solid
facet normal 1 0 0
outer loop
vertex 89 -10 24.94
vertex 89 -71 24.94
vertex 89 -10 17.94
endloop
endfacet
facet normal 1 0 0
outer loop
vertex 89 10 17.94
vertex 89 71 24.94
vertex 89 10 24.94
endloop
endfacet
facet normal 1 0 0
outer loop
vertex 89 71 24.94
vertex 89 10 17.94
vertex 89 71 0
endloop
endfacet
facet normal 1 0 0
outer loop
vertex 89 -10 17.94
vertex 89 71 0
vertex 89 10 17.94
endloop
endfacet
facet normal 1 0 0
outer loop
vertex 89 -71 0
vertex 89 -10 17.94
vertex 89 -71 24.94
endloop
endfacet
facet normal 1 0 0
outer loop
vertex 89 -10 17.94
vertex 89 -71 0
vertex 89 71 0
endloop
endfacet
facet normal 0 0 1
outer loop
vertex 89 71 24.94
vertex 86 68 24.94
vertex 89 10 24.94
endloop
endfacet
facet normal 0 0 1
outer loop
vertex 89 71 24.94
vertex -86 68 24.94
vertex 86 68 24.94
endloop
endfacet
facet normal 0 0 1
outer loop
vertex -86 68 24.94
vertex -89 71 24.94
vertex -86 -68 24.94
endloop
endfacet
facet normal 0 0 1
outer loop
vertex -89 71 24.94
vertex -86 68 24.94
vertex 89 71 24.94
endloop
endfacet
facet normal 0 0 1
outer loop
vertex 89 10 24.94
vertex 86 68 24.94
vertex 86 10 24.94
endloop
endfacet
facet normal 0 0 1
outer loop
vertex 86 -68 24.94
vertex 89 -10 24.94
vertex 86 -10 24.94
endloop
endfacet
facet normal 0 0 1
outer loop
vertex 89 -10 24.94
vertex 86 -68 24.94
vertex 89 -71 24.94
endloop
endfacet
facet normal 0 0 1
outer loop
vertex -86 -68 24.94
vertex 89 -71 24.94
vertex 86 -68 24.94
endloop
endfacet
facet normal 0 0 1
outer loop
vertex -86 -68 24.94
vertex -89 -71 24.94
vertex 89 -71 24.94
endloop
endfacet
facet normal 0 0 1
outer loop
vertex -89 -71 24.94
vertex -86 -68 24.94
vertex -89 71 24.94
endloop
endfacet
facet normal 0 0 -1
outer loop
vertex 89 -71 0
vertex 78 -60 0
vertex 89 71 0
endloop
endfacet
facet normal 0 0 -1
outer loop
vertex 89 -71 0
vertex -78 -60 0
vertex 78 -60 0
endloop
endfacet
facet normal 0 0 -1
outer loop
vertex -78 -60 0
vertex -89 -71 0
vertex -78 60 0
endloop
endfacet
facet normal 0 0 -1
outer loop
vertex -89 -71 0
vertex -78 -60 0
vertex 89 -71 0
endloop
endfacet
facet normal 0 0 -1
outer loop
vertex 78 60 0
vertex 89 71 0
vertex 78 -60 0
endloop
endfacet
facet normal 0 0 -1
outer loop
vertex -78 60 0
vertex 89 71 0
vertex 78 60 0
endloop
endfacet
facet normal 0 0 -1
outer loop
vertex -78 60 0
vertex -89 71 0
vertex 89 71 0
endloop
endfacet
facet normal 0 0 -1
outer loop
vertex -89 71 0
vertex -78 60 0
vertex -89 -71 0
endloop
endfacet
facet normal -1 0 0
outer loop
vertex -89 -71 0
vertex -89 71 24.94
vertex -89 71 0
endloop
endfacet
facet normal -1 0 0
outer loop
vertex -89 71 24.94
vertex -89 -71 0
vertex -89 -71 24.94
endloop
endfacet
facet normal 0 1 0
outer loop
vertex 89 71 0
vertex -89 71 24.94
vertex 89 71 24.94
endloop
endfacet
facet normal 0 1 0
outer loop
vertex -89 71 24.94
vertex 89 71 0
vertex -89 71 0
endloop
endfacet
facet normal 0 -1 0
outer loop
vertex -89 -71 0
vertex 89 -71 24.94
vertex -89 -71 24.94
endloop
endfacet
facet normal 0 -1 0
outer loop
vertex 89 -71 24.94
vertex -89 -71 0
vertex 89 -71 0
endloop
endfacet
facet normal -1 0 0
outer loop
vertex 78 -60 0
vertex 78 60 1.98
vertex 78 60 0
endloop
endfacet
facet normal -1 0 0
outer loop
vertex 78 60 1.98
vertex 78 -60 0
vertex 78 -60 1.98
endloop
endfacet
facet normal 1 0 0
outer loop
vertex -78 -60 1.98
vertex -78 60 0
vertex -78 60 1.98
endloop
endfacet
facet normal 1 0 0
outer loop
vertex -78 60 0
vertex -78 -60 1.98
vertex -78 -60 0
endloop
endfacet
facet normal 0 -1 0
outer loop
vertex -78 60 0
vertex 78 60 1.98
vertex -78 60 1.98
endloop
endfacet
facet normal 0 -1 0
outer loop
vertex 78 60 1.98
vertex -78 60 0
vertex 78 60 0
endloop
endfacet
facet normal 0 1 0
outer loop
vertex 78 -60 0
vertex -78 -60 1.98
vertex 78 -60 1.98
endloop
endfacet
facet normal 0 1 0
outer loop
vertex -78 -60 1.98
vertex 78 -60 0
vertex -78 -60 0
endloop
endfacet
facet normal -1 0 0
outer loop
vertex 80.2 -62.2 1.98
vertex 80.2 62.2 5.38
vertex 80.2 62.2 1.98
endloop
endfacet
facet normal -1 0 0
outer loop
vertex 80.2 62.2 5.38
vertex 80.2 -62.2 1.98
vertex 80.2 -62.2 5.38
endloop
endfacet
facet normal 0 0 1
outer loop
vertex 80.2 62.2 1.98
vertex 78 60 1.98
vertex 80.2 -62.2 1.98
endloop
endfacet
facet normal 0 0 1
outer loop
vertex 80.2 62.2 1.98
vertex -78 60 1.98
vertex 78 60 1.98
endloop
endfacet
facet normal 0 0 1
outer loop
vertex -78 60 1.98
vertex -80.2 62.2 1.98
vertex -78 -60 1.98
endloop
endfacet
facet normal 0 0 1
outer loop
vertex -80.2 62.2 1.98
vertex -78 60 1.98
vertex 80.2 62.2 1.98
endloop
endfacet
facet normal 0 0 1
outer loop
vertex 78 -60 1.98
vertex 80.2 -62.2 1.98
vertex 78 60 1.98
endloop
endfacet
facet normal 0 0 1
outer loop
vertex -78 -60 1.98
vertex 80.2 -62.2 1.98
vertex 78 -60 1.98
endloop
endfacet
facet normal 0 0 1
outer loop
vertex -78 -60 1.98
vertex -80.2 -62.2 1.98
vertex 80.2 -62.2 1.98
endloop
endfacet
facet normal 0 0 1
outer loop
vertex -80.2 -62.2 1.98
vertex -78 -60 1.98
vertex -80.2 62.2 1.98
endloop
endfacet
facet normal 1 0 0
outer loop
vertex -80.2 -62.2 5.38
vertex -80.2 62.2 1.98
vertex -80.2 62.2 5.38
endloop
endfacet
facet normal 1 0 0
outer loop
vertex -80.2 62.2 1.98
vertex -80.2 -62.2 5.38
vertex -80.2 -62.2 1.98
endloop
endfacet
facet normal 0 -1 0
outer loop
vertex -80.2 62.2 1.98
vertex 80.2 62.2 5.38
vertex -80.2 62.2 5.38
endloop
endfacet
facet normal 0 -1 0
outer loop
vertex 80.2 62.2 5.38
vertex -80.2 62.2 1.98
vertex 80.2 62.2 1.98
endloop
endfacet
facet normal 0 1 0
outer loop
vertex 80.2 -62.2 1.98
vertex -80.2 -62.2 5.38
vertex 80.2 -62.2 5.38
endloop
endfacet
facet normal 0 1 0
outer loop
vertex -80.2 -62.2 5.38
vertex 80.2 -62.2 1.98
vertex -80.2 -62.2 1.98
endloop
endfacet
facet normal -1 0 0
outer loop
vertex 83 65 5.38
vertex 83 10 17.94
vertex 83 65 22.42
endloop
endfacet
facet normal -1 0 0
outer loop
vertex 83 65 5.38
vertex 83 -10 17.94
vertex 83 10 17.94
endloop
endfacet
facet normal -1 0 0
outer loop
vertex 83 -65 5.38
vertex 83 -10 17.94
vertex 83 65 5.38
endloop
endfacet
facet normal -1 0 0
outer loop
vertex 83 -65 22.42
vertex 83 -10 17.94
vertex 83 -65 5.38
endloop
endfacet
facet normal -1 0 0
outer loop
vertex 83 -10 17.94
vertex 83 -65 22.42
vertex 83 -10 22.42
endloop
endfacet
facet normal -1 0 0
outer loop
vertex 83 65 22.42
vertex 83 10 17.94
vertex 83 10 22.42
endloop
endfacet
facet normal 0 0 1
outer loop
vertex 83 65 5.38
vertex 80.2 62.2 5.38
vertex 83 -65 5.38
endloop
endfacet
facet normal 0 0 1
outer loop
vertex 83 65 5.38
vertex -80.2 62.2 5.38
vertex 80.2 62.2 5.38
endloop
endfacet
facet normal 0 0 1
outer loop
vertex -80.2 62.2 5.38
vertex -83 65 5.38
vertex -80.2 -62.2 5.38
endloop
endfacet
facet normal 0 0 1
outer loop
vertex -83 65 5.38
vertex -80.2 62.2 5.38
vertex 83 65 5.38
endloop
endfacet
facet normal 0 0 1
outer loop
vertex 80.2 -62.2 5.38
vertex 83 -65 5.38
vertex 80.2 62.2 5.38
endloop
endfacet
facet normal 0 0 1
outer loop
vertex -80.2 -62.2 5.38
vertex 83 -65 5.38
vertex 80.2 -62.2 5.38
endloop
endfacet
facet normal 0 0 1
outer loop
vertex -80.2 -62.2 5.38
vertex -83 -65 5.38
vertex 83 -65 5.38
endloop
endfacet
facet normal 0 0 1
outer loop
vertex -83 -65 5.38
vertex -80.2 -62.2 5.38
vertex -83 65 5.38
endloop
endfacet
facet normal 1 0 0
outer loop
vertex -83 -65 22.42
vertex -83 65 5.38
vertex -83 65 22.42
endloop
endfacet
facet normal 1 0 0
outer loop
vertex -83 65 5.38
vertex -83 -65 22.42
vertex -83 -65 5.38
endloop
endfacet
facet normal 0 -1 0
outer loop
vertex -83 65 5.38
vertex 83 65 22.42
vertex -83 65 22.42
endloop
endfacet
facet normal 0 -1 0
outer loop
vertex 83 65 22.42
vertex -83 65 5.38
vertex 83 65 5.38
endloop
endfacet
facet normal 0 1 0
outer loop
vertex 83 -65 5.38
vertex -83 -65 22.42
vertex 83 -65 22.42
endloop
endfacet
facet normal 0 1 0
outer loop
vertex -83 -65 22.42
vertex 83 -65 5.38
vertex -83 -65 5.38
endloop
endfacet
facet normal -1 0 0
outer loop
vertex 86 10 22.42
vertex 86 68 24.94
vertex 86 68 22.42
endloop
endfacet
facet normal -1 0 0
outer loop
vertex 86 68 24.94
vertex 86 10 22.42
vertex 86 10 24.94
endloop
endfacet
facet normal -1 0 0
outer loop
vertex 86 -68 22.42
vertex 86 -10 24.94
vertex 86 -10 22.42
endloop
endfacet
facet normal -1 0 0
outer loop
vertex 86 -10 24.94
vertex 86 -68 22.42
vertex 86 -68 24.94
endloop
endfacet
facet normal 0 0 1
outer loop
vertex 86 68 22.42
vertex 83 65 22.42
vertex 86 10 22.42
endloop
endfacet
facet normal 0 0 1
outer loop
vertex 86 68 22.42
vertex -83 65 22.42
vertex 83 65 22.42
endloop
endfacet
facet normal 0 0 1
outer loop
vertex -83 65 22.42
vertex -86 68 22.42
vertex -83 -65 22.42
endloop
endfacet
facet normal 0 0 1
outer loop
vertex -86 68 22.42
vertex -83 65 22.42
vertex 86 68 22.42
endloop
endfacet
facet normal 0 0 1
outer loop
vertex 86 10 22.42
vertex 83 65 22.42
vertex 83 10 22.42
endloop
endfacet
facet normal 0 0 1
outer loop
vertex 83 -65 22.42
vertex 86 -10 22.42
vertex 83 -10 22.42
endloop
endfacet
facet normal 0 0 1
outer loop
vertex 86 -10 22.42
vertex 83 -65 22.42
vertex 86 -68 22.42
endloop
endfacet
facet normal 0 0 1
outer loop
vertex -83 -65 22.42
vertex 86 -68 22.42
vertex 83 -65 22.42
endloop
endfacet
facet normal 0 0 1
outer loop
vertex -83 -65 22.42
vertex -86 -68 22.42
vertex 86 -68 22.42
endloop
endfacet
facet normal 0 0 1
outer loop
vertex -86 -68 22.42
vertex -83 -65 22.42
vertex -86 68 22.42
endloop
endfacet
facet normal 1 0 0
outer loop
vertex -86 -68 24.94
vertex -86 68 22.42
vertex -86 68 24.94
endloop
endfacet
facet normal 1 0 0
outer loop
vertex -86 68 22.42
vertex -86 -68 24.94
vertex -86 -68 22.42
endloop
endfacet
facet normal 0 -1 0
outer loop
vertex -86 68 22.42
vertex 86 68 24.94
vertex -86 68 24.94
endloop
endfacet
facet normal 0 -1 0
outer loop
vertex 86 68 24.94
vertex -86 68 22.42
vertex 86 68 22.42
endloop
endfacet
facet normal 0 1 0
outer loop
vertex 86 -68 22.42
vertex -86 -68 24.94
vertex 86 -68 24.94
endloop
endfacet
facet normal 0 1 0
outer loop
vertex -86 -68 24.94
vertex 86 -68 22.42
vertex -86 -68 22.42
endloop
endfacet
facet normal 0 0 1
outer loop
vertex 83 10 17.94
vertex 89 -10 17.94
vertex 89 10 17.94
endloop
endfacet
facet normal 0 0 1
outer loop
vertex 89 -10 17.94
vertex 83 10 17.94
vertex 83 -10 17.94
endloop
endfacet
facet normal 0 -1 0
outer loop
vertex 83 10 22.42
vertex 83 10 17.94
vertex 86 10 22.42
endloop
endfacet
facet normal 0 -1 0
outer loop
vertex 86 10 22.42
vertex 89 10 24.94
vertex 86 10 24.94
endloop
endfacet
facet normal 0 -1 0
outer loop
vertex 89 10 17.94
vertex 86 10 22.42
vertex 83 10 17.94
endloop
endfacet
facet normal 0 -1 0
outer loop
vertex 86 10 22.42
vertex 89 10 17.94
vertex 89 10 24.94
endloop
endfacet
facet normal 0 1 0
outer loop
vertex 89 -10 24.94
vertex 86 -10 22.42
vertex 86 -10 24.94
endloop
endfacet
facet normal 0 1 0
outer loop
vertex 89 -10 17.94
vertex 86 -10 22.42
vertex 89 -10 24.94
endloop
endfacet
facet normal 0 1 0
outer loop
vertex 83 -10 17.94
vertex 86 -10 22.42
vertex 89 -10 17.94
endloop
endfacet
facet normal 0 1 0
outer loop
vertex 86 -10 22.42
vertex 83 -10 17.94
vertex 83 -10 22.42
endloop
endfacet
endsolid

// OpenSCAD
// Caixa paramétrica para litofania 160 x 124 x 3 mm.
// Conceito V5 aprovado; espessura LED e tomada USB medidas pelo utilizador.
// Imprimir body com a frente em Z=0, lid e retainer com a face plana em Z=0.

part = "body"; // body, lid, retainer, assembly
$fn = 48;

// Elementos medidos e dimensões propostas (mm)
litho_w = 160;
litho_h = 124;
litho_t = 3;
outer_w = 178;
outer_h = 142;
front_window_w = 156;
front_window_h = 120;
front_lip_t = 2;
litho_xy_clearance = 0.2; // por lado
litho_z_clearance = 0.4;
inner_w = 166;
inner_h = 130;
rear_seat_w = 172;
rear_seat_h = 136;
rear_seat_depth = 2.5;
rear_lid_xy_clearance = 0.2; // por lado
rear_lid_t = 2.4;
light_gap = 15; // verso da litofania ate face emissora do LED
led_total_thickness = 2.04; // espessura total: face superior luminosa ate base traseira
retainer_t = 1.8;
retainer_xy_clearance = 0.2; // por lado

// A USB-C esta no centro da extremidade curta do PCB, lado direito.
usb_port_w = 8.88; // largura exterior da tomada medida
usb_port_h = 3.04; // altura exterior da tomada medida
usb_notch_width_y = 20; // reserva para o corpo da FICHA, ainda nao medido
usb_notch_start_x = 76; // relativo ao centro da placa
usb_body_notch_from_back = 7; // AJUSTAR a altura da porta

litho_pocket_w = litho_w + 2*litho_xy_clearance;
litho_pocket_h = litho_h + 2*litho_xy_clearance;
litho_pocket_d = litho_t + litho_z_clearance;
panel_back_z = front_lip_t + litho_pocket_d;
body_depth = panel_back_z + light_gap + led_total_thickness + rear_seat_depth;
seat_start_z = body_depth - rear_seat_depth;
rear_lid_w = rear_seat_w - 2*rear_lid_xy_clearance;
rear_lid_h = rear_seat_h - 2*rear_lid_xy_clearance;
retainer_w = inner_w - 2*retainer_xy_clearance;
retainer_h = inner_h - 2*retainer_xy_clearance;
eps = 0.02;

module body() {
    difference() {
        translate([-outer_w/2, -outer_h/2, 0])
            cube([outer_w, outer_h, body_depth]);
        // Janela frontal: frente impressa sobre o prato.
        translate([-front_window_w/2, -front_window_h/2, -eps])
            cube([front_window_w, front_window_h, front_lip_t+2*eps]);
        // Assento da litofania, inserida pelas costas.
        translate([-litho_pocket_w/2, -litho_pocket_h/2, front_lip_t-eps])
            cube([litho_pocket_w, litho_pocket_h, litho_pocket_d+2*eps]);
        // Camara luminosa com espaco para o aro retentor.
        translate([-inner_w/2, -inner_h/2, panel_back_z-eps])
            cube([inner_w, inner_h, seat_start_z-panel_back_z+2*eps]);
        // Rebaixo posterior: deixa uma aba de apoio de 3 mm.
        translate([-rear_seat_w/2, -rear_seat_h/2, seat_start_z-eps])
            cube([rear_seat_w, rear_seat_h, rear_seat_depth+2*eps]);
        // Alivio no bordo traseiro do corpo para ficha USB exterior.
        translate([inner_w/2-eps, -usb_notch_width_y/2, body_depth-usb_body_notch_from_back])
            cube([outer_w/2-inner_w/2+2*eps, usb_notch_width_y, usb_body_notch_from_back+eps]);
    }
}

module lid() {
    difference() {
        translate([-rear_lid_w/2, -rear_lid_h/2, 0])
            cube([rear_lid_w, rear_lid_h, rear_lid_t]);
        // Rebaixo aberto ate a tomada fixa na extremidade curta do LED.
        translate([usb_notch_start_x, -usb_notch_width_y/2, -eps])
            cube([rear_lid_w/2-usb_notch_start_x+eps, usb_notch_width_y, rear_lid_t+2*eps]);
    }
}

module retainer() {
    difference() {
        translate([-retainer_w/2, -retainer_h/2, 0])
            cube([retainer_w, retainer_h, retainer_t]);
        translate([-front_window_w/2, -front_window_h/2, -eps])
            cube([front_window_w, front_window_h, retainer_t+2*eps]);
    }
}

if (part == "body") body();
else if (part == "lid") lid();
else if (part == "retainer") retainer();
else if (part == "assembly") {
    color("#303d49") body();
    color("#e4d9ba") translate([0,0,front_lip_t+litho_t/2])
        cube([litho_w, litho_h, litho_t], center=true);
    color("#a4b4b8") translate([0,0,panel_back_z]) retainer();
    color("#dbe4e9") translate([0,0,seat_start_z]) lid();
}
